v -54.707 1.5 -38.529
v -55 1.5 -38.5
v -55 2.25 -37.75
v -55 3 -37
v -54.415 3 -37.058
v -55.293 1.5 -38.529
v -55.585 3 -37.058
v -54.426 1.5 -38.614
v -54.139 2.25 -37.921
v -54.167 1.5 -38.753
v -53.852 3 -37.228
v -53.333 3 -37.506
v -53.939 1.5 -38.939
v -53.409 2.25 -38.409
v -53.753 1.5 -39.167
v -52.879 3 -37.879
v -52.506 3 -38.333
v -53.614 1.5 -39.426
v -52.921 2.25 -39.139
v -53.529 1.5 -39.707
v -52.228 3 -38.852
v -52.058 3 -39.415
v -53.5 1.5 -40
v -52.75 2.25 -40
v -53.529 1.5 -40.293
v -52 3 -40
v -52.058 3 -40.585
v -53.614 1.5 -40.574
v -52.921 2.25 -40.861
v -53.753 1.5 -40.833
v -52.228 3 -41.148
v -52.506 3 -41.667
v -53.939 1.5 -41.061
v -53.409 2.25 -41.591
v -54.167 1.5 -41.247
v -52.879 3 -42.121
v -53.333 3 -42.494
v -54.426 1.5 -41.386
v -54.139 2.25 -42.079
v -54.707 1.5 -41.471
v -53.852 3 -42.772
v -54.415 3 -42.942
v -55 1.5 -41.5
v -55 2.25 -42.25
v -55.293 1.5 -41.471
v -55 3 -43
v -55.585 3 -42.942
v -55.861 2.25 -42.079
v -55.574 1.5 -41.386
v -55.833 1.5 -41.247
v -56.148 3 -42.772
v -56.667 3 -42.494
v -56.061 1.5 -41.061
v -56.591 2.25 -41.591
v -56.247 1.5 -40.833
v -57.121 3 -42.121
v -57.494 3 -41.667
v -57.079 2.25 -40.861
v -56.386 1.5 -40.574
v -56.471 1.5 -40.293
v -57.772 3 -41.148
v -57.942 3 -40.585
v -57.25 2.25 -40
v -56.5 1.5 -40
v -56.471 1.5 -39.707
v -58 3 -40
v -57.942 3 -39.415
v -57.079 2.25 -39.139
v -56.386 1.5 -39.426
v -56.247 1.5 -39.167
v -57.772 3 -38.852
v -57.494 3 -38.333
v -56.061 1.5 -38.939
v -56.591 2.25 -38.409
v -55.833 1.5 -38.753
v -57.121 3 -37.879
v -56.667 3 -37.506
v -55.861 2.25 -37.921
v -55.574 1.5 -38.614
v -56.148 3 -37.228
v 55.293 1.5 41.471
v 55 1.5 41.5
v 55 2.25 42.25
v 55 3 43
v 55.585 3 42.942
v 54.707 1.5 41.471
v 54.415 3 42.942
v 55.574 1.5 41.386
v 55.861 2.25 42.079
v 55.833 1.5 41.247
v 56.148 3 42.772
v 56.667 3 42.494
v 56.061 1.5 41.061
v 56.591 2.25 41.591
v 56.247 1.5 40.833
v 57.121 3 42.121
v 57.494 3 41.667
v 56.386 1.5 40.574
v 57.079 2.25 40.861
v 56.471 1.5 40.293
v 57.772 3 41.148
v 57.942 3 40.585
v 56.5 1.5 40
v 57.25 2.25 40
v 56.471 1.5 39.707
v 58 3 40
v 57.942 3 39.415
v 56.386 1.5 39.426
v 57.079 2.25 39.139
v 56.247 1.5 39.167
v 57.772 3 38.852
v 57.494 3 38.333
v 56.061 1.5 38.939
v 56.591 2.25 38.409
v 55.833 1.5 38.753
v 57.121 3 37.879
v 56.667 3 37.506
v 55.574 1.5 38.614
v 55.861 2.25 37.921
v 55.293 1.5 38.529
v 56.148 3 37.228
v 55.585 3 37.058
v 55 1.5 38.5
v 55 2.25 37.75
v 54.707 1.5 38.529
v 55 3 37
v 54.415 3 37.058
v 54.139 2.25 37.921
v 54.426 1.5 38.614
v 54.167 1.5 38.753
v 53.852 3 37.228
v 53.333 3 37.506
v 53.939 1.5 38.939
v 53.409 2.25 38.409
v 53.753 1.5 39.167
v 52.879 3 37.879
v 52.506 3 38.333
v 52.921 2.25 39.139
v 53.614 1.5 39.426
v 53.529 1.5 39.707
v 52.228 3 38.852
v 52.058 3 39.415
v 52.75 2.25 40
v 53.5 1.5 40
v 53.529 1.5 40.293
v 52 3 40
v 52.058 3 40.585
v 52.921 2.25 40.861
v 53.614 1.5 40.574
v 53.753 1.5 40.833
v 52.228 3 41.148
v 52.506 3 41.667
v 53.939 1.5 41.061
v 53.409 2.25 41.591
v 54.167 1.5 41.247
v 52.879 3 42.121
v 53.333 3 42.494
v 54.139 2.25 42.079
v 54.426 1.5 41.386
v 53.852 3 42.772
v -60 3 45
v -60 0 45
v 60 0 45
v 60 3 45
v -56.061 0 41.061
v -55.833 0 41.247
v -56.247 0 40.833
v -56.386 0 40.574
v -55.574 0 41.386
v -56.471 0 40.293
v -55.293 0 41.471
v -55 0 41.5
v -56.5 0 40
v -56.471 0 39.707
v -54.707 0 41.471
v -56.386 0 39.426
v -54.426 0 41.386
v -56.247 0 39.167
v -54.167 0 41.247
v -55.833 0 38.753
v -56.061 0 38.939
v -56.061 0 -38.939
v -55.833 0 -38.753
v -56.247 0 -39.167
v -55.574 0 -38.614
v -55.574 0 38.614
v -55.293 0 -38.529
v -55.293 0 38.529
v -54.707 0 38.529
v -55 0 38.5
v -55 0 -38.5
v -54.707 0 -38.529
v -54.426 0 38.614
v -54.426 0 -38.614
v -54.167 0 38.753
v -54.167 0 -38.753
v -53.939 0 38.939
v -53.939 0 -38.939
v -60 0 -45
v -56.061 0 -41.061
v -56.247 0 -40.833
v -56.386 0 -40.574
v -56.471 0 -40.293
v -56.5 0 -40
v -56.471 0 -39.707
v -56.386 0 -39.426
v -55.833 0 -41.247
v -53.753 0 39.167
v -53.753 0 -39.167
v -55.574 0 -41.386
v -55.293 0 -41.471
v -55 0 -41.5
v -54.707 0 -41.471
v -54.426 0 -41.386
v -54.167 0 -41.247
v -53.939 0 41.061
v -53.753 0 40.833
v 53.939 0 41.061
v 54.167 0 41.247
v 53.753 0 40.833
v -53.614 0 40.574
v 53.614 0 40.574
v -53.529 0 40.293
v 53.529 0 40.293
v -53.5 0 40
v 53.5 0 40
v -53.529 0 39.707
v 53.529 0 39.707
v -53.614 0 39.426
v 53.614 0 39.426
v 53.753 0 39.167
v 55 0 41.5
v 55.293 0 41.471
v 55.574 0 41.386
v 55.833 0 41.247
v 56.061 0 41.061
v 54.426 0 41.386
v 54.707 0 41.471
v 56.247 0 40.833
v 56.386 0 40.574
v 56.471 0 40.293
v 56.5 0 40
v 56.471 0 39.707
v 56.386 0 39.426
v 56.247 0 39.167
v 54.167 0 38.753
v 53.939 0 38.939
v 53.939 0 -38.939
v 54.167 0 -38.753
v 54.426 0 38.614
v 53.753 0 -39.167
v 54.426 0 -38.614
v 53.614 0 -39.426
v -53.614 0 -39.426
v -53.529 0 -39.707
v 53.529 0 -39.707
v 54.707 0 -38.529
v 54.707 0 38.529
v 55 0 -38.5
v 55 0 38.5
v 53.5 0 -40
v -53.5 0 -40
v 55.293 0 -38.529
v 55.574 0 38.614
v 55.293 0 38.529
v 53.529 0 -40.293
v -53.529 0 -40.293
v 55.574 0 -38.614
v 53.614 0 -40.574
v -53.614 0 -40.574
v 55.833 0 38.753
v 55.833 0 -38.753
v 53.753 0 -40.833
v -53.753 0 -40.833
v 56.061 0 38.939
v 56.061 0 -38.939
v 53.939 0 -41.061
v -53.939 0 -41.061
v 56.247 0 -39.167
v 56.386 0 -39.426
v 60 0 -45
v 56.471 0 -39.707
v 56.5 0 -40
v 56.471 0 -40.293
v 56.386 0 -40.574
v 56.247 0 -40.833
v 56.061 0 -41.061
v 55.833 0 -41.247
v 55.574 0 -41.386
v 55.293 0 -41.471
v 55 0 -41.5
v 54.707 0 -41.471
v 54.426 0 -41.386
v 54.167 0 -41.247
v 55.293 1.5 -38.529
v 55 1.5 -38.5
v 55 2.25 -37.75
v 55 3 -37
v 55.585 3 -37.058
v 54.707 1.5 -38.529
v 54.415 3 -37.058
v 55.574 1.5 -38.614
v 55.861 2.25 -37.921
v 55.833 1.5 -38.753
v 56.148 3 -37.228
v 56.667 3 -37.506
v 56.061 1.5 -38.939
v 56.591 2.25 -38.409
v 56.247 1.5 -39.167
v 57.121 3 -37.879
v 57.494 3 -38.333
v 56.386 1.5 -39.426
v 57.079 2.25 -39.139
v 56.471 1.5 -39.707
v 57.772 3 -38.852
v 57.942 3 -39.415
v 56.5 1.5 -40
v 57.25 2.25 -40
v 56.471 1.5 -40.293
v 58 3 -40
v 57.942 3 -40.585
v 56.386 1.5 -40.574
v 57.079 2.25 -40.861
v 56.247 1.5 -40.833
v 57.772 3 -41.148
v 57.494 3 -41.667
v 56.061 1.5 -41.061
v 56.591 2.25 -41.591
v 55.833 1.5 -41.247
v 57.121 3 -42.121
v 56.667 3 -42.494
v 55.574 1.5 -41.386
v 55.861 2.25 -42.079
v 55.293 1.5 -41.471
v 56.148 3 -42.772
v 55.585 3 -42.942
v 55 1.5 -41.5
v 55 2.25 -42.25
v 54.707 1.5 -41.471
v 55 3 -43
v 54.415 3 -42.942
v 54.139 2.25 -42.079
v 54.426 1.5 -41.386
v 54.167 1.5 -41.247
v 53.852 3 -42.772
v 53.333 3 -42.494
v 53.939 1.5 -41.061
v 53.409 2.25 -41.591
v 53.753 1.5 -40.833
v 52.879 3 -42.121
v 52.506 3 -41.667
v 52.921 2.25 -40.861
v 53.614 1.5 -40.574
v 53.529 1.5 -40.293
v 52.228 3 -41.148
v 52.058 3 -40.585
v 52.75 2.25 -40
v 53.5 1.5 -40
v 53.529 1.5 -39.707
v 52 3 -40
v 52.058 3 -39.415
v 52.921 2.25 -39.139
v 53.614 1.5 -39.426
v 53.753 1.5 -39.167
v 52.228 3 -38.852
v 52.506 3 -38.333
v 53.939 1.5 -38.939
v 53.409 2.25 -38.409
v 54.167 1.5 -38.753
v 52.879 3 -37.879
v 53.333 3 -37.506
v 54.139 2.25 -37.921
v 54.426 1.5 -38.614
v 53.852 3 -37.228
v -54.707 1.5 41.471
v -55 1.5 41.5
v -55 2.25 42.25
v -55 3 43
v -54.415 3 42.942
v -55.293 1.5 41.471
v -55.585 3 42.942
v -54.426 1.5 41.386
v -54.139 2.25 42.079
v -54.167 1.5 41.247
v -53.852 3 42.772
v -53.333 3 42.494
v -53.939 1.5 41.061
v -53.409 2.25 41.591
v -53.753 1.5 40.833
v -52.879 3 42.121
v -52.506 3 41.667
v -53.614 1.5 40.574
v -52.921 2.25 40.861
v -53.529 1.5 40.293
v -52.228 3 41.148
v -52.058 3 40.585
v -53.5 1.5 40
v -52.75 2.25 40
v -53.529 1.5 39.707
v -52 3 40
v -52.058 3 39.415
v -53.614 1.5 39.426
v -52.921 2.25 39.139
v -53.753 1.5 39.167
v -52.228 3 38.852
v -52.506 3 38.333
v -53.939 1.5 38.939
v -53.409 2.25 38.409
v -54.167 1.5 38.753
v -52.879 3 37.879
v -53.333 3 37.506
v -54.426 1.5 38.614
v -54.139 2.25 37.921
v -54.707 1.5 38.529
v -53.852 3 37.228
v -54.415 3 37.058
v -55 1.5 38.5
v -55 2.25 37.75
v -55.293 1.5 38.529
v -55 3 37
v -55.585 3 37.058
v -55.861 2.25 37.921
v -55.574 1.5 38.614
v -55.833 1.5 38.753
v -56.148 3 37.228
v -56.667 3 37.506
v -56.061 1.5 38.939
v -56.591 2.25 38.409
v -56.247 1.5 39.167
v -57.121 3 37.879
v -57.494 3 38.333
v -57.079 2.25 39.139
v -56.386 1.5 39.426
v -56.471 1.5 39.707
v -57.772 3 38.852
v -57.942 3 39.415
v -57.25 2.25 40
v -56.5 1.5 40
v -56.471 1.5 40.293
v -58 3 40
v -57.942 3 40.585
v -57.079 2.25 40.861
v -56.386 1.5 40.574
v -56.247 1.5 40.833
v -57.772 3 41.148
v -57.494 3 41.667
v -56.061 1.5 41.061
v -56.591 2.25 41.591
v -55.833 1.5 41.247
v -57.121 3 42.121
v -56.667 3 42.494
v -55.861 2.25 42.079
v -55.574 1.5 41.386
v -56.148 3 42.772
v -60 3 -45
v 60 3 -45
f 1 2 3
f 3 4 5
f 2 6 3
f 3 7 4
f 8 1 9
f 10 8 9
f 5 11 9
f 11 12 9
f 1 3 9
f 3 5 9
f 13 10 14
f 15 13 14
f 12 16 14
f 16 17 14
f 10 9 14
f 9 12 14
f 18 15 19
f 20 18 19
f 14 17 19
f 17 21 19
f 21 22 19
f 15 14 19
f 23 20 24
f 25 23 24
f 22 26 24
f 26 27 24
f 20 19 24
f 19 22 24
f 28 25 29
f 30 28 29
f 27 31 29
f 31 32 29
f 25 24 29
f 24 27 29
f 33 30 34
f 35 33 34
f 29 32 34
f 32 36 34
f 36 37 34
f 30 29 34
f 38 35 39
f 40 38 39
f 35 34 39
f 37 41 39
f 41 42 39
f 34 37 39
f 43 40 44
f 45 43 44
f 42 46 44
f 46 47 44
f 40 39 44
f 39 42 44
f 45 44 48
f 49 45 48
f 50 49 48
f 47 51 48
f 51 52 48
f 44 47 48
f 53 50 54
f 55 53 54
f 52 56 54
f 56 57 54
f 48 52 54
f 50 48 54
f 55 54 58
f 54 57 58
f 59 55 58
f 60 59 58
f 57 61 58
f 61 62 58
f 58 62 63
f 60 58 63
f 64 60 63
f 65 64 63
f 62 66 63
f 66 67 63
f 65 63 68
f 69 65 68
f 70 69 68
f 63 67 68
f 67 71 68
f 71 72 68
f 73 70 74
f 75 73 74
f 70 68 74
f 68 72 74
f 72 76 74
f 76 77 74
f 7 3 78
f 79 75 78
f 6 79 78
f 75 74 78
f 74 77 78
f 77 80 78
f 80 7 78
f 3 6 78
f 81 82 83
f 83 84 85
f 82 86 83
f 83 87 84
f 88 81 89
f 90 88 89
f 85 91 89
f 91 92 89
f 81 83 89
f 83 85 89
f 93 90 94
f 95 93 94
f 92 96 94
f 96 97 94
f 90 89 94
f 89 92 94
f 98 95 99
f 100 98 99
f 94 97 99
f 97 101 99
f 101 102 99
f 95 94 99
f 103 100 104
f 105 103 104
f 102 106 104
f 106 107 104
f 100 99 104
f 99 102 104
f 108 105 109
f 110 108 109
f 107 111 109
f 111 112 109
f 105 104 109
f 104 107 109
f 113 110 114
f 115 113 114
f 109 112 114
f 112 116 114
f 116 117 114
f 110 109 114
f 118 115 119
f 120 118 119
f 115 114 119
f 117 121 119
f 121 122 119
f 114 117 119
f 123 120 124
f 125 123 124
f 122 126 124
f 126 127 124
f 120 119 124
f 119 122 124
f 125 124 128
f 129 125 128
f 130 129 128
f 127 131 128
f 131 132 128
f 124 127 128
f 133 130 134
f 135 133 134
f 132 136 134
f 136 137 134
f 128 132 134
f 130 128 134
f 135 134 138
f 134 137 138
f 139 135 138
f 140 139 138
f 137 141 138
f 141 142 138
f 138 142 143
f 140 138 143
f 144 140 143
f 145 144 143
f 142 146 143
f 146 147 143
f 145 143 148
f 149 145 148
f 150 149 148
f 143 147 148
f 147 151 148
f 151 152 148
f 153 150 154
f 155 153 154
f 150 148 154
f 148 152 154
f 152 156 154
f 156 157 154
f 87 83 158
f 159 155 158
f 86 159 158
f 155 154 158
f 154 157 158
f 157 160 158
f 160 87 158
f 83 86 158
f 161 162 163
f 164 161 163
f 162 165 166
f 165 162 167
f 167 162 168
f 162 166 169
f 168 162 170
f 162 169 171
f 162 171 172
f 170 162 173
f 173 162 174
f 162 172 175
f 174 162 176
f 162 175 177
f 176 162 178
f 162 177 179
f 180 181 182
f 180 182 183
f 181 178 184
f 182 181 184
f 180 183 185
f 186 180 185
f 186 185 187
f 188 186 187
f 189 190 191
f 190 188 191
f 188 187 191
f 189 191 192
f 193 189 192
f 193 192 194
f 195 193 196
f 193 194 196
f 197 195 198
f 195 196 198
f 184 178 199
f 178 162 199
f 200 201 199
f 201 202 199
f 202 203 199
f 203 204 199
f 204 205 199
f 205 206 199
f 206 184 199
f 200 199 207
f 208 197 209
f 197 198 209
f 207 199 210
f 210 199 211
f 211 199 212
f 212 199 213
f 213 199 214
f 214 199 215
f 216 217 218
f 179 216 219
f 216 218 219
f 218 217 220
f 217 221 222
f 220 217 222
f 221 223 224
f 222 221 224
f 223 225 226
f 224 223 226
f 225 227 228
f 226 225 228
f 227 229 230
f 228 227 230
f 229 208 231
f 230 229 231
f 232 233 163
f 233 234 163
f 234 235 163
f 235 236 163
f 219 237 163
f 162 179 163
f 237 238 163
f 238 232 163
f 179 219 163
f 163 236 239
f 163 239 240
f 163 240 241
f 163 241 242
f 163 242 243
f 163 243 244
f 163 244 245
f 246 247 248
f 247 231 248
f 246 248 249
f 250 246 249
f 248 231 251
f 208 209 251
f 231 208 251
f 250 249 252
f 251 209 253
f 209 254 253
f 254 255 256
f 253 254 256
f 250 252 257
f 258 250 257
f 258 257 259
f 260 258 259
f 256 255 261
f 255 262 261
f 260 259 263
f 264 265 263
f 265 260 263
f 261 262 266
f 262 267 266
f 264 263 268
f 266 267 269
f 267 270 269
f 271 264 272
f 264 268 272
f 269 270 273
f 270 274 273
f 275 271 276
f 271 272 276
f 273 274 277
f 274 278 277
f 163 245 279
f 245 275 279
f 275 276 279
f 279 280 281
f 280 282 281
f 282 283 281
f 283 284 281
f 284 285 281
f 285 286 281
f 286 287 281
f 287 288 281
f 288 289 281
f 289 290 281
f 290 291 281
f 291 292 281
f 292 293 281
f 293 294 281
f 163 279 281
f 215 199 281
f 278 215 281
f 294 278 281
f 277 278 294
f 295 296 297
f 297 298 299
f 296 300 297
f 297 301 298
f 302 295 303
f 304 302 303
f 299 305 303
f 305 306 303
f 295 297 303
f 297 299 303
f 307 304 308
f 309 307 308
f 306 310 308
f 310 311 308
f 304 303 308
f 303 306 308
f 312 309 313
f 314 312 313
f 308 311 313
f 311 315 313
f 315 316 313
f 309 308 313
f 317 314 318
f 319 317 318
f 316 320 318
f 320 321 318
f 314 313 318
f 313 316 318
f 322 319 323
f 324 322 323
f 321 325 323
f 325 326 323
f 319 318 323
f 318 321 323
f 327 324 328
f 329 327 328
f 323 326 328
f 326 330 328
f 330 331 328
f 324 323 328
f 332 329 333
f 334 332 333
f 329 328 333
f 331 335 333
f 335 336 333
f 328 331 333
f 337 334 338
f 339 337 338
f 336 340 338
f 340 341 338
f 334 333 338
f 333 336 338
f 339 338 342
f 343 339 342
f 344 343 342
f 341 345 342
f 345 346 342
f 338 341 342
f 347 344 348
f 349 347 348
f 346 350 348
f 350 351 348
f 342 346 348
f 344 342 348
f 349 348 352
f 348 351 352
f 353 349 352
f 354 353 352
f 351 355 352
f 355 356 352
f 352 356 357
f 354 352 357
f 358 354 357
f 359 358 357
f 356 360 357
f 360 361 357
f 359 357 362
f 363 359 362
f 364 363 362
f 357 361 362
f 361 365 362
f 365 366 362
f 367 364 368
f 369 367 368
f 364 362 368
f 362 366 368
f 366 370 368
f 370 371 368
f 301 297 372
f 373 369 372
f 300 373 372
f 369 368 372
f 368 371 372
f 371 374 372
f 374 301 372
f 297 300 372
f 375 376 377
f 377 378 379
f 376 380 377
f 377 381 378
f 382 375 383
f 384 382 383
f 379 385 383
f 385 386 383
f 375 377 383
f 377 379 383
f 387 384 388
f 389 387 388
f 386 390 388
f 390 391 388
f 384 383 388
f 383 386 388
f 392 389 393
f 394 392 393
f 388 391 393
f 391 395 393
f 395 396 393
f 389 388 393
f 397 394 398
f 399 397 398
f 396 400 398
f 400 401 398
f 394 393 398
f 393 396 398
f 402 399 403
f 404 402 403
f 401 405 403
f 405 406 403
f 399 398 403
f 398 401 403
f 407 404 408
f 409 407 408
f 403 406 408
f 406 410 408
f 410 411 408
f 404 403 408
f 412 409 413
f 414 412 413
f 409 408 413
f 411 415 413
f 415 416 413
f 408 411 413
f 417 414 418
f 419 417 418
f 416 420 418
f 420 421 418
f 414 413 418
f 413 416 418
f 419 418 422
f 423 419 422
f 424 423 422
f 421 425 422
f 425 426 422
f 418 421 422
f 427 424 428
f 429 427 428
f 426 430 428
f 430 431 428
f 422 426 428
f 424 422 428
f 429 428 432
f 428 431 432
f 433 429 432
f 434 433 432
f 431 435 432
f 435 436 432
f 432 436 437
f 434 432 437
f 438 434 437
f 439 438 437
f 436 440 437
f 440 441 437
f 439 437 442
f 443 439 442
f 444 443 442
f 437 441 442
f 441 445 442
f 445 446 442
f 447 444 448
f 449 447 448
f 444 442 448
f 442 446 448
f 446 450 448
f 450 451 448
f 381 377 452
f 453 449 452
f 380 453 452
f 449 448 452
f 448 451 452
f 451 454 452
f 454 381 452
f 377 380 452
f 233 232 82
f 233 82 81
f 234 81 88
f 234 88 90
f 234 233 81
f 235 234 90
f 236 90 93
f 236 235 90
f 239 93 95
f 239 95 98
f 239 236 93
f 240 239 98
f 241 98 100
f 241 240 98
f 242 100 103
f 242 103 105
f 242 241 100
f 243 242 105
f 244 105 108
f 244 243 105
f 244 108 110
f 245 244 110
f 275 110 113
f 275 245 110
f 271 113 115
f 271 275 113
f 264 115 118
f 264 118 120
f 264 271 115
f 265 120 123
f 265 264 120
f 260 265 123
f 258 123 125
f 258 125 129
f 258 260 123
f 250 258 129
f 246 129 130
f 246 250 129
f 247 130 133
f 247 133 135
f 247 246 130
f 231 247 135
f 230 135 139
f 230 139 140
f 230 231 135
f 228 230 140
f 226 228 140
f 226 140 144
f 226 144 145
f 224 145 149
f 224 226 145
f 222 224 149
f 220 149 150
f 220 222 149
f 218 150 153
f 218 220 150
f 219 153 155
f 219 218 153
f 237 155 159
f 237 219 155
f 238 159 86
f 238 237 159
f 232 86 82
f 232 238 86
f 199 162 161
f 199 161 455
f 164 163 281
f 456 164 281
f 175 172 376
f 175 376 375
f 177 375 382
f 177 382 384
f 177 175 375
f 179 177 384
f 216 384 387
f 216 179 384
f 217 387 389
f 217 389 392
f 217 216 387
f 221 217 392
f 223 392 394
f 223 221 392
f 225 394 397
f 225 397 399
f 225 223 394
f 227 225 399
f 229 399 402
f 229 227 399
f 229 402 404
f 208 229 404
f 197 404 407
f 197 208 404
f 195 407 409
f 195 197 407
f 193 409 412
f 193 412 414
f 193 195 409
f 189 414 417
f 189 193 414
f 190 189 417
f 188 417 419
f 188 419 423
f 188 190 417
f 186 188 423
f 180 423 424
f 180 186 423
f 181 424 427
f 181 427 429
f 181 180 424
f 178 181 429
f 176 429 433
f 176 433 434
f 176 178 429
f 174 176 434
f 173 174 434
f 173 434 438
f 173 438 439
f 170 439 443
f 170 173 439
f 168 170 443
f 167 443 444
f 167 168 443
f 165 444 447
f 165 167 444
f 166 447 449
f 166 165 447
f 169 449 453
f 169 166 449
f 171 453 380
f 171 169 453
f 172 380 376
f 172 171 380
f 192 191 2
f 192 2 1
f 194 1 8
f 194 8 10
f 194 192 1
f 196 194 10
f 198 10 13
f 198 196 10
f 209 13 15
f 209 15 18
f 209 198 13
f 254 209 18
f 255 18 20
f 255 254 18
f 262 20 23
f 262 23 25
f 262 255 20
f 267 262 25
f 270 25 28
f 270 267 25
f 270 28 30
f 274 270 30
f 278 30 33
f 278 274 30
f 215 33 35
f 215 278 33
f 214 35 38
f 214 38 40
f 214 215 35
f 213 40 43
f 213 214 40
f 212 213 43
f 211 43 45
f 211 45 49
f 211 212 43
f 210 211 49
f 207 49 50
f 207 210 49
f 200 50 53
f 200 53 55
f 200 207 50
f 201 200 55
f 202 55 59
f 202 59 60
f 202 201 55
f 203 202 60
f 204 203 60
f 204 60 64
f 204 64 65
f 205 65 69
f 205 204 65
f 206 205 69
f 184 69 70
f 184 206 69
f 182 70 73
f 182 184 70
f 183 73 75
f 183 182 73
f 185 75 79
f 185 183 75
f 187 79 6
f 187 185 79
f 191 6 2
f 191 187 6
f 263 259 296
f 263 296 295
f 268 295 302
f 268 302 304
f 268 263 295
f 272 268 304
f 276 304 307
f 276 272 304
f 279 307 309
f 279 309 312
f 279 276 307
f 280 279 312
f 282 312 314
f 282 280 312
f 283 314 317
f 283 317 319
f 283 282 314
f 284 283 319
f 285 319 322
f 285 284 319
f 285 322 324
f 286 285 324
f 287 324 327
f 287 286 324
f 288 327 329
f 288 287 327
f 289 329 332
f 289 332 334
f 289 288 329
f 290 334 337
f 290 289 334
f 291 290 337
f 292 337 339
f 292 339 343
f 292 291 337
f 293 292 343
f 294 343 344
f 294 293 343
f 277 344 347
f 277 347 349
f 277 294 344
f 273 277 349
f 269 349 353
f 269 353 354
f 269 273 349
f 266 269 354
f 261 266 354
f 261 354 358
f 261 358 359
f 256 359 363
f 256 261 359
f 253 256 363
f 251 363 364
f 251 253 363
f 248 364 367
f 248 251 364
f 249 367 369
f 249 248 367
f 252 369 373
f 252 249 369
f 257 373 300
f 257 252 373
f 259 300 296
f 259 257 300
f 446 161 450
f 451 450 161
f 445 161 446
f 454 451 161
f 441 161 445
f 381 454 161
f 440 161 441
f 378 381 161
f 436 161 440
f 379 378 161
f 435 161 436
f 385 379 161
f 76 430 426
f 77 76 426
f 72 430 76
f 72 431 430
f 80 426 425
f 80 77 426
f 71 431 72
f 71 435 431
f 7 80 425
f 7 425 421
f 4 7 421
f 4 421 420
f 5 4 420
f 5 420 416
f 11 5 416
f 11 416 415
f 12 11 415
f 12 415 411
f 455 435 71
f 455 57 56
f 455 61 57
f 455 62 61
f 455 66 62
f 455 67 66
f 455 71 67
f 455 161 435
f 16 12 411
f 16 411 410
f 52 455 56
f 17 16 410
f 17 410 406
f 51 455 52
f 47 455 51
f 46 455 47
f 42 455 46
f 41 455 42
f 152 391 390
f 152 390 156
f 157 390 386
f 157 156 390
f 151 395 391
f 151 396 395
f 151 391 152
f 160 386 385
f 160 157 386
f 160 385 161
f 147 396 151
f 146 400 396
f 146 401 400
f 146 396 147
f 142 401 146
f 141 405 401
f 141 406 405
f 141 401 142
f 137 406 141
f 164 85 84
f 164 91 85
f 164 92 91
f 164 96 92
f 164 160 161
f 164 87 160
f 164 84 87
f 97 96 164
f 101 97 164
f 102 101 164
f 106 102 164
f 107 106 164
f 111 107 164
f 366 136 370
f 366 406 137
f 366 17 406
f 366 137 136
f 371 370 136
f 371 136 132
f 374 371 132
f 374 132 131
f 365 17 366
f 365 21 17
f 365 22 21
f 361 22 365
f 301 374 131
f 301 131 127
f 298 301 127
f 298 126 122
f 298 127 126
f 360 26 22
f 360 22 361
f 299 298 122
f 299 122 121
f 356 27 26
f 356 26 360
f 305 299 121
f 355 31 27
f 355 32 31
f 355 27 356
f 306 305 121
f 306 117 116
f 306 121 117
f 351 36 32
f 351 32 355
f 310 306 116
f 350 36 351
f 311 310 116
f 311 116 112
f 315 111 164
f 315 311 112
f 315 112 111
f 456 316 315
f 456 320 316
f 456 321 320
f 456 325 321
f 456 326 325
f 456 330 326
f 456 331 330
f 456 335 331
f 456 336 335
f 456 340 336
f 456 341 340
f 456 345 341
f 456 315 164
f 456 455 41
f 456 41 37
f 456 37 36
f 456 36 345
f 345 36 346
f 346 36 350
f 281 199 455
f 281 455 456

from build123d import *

# Parameters (mm, degrees)
SKETCH1_W           = 120
SKETCH1_H           = 90
SKETCH1_R           = 1.5
BOSS_EXTRUDE1_DEPTH = 3
CHAMFER1_SIZE       = 1.5


with BuildPart() as part:
    # Sketch1 → Boss-Extrude1 (new body)
    with BuildSketch(Plane(origin=(0, 0, 0), x_dir=(1, 0, 0), z_dir=(0, 1, 0))):
        Rectangle(SKETCH1_W, SKETCH1_H)
        with Locations(Location((-55, 40, 0), (0, 0, 270))):
            Circle(SKETCH1_R, mode=Mode.SUBTRACT)
        with Locations(Location((-55, -40, 0), (0, 0, 270))):
            Circle(SKETCH1_R, mode=Mode.SUBTRACT)
        with Locations(Location((55, -40, 0), (0, 0, 270))):
            Circle(SKETCH1_R, mode=Mode.SUBTRACT)
        with Locations(Location((55, 40, 0), (0, 0, 270))):
            Circle(SKETCH1_R, mode=Mode.SUBTRACT)
    extrude(amount=BOSS_EXTRUDE1_DEPTH)

    # Chamfer1
    chamfer1_edges = [part.edges().sort_by_distance(p)[0] for p in [
        (-55, 3, -41.5),
        (-55, 3, 38.5),
        (55, 3, 38.5),
        (55, 3, -41.5),
    ]]
    chamfer(chamfer1_edges, length=CHAMFER1_SIZE)


solid = part.part
